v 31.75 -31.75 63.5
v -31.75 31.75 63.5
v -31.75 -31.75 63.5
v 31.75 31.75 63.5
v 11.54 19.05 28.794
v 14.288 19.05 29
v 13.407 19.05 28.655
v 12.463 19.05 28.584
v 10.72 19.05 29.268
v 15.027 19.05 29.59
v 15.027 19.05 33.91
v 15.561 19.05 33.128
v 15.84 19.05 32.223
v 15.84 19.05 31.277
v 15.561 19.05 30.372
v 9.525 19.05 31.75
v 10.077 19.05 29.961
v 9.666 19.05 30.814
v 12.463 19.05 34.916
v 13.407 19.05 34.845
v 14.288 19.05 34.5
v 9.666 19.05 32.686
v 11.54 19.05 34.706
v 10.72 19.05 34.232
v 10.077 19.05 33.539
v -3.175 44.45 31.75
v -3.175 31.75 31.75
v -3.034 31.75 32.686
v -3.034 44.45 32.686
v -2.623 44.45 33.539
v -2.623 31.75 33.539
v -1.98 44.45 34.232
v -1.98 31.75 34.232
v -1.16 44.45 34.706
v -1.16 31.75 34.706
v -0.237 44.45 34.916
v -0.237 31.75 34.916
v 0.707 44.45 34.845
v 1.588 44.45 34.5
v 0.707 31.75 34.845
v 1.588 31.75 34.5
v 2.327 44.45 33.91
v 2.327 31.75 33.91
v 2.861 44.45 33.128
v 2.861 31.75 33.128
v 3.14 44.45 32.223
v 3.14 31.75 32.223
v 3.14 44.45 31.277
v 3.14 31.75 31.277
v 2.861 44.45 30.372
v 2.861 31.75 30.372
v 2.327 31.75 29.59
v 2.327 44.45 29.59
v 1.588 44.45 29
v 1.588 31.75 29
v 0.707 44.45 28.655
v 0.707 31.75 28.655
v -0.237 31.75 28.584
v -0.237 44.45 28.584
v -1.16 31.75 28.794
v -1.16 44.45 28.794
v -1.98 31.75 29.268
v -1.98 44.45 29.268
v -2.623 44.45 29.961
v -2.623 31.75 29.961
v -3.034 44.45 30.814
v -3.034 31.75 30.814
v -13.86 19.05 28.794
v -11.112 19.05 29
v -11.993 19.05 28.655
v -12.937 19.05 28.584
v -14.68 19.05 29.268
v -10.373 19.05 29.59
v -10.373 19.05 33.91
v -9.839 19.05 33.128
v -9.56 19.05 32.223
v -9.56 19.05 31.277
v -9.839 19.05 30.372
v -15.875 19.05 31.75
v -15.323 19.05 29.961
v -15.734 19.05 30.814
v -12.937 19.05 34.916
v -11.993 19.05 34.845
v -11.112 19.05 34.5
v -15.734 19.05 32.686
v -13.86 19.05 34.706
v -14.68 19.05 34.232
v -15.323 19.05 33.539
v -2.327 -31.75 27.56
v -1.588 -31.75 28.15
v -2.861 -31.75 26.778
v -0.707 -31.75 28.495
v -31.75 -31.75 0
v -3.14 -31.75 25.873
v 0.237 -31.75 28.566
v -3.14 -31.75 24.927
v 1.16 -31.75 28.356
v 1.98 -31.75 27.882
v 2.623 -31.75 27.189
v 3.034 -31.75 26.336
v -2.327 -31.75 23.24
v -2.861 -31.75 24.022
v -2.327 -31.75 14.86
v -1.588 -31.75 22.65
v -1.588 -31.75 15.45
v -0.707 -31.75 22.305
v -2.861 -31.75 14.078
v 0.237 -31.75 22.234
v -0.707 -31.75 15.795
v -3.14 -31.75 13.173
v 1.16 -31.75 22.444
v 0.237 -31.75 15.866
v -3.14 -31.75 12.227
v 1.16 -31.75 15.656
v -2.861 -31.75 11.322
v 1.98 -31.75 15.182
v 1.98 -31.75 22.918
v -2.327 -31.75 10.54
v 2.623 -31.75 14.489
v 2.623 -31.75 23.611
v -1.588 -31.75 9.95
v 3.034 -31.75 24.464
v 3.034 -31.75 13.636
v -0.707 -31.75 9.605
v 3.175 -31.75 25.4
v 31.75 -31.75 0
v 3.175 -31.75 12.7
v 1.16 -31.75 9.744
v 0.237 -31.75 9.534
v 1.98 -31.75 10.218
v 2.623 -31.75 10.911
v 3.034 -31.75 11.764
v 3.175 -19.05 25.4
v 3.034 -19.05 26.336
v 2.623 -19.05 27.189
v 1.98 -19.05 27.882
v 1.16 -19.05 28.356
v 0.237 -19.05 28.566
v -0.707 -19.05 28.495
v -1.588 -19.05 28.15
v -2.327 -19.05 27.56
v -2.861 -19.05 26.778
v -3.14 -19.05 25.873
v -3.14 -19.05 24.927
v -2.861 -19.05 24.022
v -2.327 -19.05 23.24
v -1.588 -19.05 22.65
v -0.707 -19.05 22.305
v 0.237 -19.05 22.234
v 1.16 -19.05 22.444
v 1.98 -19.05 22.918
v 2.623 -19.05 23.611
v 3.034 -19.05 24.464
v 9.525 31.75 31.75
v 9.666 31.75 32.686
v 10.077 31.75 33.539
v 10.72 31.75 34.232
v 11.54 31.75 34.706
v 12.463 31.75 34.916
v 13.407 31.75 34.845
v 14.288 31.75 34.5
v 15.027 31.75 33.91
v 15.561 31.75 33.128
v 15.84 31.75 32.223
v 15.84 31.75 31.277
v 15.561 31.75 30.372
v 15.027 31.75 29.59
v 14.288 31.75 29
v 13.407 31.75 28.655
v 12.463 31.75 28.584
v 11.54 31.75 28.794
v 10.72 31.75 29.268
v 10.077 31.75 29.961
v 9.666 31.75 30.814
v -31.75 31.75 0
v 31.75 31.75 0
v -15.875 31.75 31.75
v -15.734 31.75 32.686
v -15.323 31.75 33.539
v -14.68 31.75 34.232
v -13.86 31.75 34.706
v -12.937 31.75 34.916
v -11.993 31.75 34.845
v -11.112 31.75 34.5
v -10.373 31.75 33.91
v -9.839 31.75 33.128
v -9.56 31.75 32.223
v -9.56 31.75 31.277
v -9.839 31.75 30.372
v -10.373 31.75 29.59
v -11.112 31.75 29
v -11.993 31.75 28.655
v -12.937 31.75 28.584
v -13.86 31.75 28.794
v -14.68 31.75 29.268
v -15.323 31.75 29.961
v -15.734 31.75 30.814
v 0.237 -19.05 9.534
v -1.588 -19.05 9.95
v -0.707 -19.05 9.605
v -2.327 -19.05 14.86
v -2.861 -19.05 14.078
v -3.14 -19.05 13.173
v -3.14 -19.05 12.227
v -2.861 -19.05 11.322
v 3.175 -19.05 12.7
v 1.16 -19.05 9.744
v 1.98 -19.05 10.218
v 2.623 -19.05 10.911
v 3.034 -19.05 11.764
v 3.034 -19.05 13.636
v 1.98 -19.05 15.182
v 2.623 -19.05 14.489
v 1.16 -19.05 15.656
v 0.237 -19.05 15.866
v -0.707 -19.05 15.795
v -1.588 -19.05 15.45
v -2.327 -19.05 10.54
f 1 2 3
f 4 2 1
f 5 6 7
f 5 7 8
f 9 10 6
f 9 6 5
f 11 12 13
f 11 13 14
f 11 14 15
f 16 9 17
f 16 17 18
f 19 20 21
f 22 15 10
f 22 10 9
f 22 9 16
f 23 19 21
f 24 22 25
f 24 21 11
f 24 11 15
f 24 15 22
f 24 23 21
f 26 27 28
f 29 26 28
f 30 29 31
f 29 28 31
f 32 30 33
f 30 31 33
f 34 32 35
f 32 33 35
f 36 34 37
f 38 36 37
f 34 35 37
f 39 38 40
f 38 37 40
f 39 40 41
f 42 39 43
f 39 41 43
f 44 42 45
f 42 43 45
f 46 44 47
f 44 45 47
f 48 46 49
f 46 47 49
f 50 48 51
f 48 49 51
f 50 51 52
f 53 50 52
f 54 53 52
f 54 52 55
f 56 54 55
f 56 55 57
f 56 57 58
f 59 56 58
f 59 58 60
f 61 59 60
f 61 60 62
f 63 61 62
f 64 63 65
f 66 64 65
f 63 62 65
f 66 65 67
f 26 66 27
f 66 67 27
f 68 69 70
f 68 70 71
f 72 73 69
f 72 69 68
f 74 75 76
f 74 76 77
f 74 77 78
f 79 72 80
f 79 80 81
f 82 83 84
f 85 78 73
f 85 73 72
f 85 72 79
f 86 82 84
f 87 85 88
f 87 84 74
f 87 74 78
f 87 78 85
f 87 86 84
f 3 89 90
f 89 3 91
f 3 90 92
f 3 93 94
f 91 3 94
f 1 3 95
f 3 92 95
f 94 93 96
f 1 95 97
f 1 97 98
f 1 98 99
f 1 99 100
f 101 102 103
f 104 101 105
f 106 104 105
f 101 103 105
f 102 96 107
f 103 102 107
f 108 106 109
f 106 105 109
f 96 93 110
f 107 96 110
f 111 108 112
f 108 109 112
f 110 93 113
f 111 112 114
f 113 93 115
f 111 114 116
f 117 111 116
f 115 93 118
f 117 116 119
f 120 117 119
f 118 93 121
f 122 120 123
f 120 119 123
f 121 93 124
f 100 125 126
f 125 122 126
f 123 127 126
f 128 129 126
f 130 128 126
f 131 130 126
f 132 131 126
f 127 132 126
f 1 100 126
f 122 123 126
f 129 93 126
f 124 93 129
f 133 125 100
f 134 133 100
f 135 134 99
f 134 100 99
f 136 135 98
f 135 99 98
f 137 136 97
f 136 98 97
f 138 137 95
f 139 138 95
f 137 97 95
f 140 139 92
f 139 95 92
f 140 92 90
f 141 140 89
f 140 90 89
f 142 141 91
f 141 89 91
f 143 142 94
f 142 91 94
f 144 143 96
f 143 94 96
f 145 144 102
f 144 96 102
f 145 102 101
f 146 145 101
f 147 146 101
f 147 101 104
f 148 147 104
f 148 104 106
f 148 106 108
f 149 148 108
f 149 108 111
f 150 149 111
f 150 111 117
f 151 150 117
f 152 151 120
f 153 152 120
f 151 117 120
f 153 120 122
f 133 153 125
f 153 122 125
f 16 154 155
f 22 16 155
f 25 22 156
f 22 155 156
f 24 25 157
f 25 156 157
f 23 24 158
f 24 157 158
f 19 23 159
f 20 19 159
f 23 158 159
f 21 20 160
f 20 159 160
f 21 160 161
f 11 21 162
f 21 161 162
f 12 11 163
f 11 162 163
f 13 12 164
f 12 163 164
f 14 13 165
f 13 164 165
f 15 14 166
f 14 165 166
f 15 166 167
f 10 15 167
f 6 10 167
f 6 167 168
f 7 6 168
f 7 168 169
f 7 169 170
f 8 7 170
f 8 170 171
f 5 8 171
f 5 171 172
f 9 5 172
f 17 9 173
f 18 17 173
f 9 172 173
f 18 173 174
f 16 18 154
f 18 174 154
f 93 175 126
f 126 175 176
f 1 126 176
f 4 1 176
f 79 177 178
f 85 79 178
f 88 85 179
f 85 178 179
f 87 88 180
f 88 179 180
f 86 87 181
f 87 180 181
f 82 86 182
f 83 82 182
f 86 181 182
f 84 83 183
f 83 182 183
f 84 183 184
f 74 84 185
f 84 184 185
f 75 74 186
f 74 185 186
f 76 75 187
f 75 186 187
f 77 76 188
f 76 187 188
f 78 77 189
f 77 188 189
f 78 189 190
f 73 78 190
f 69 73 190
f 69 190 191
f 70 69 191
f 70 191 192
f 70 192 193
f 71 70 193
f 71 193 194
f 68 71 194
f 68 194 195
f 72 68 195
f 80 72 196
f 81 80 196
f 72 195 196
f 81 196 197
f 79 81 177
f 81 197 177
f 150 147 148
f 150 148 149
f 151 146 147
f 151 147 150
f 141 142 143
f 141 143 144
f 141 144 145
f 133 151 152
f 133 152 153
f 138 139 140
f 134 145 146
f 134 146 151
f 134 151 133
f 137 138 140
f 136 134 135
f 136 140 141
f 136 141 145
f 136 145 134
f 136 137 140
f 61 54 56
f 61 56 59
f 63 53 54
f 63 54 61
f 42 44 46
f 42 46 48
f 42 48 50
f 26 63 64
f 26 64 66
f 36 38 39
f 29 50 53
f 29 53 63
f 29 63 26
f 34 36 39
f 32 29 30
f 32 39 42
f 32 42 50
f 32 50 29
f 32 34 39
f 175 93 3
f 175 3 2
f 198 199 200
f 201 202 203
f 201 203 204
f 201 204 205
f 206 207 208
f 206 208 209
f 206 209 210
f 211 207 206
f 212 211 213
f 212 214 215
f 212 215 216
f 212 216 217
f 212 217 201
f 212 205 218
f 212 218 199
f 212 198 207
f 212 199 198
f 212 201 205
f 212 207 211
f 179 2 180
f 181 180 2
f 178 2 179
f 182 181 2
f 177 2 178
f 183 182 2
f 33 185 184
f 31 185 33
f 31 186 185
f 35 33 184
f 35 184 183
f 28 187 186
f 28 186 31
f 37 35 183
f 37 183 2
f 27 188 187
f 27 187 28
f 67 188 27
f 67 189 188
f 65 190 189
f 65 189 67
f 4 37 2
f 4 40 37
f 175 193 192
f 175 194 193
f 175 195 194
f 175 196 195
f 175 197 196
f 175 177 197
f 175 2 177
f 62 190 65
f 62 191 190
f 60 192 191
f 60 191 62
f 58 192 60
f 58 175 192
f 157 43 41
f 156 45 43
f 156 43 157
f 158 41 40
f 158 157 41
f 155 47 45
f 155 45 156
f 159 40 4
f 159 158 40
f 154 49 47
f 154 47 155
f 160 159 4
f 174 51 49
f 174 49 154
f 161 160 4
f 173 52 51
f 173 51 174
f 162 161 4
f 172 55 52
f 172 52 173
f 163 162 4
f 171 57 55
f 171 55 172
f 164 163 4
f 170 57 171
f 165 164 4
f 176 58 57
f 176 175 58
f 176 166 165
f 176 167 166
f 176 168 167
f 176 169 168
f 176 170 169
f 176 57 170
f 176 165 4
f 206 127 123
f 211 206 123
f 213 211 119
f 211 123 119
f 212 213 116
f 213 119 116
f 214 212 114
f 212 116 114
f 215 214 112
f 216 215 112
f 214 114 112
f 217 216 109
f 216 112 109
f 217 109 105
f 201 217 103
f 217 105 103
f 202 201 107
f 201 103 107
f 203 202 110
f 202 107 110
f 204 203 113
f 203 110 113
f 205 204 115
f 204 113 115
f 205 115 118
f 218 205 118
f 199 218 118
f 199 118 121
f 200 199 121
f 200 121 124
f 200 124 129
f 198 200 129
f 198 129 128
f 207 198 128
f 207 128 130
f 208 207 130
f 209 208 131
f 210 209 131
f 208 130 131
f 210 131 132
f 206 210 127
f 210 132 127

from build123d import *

# Parameters (mm, degrees)
F0_W     = 63.5
F0_H     = 63.5
F1_DEPTH = 63.5
F2_R     = 3.175
F3_DEPTH = 12.7
F4_DEPTH = 12.7
F5_R     = 3.175
F6_DEPTH = 12.7


with BuildPart() as f1:
    # F0 (on Top) → F1 (new body)
    with BuildSketch(Plane.XY):
        Rectangle(F0_W, F0_H)
    extrude(amount=F1_DEPTH)

    # F2 (on face) → F3 (join)
    with BuildSketch(Plane(origin=(0, 31.75, 0), x_dir=(-1, 0, 0), z_dir=(0, 1, 0))):
        with Locations((0, 31.75)):
            Circle(F2_R)
    extrude(amount=F3_DEPTH)

    # F2 (on face) → F4 (cut)
    with BuildSketch(Plane(origin=(0, 31.75, 0), x_dir=(-1, 0, 0), z_dir=(0, 1, 0))):
        with Locations((-12.7, 31.75)):
            Circle(F2_R)
        with Locations((12.7, 31.75)):
            Circle(F2_R)
    extrude(amount=-F4_DEPTH, mode=Mode.SUBTRACT)

    # F5 (on face) → F6 (cut)
    with BuildSketch(Plane.XZ.offset(31.75)):
        with Locations((0, 25.4)):
            Circle(F5_R)
        with Locations((0, 12.7)):
            Circle(F5_R)
    extrude(amount=-F6_DEPTH, mode=Mode.SUBTRACT)


solid = f1.part
